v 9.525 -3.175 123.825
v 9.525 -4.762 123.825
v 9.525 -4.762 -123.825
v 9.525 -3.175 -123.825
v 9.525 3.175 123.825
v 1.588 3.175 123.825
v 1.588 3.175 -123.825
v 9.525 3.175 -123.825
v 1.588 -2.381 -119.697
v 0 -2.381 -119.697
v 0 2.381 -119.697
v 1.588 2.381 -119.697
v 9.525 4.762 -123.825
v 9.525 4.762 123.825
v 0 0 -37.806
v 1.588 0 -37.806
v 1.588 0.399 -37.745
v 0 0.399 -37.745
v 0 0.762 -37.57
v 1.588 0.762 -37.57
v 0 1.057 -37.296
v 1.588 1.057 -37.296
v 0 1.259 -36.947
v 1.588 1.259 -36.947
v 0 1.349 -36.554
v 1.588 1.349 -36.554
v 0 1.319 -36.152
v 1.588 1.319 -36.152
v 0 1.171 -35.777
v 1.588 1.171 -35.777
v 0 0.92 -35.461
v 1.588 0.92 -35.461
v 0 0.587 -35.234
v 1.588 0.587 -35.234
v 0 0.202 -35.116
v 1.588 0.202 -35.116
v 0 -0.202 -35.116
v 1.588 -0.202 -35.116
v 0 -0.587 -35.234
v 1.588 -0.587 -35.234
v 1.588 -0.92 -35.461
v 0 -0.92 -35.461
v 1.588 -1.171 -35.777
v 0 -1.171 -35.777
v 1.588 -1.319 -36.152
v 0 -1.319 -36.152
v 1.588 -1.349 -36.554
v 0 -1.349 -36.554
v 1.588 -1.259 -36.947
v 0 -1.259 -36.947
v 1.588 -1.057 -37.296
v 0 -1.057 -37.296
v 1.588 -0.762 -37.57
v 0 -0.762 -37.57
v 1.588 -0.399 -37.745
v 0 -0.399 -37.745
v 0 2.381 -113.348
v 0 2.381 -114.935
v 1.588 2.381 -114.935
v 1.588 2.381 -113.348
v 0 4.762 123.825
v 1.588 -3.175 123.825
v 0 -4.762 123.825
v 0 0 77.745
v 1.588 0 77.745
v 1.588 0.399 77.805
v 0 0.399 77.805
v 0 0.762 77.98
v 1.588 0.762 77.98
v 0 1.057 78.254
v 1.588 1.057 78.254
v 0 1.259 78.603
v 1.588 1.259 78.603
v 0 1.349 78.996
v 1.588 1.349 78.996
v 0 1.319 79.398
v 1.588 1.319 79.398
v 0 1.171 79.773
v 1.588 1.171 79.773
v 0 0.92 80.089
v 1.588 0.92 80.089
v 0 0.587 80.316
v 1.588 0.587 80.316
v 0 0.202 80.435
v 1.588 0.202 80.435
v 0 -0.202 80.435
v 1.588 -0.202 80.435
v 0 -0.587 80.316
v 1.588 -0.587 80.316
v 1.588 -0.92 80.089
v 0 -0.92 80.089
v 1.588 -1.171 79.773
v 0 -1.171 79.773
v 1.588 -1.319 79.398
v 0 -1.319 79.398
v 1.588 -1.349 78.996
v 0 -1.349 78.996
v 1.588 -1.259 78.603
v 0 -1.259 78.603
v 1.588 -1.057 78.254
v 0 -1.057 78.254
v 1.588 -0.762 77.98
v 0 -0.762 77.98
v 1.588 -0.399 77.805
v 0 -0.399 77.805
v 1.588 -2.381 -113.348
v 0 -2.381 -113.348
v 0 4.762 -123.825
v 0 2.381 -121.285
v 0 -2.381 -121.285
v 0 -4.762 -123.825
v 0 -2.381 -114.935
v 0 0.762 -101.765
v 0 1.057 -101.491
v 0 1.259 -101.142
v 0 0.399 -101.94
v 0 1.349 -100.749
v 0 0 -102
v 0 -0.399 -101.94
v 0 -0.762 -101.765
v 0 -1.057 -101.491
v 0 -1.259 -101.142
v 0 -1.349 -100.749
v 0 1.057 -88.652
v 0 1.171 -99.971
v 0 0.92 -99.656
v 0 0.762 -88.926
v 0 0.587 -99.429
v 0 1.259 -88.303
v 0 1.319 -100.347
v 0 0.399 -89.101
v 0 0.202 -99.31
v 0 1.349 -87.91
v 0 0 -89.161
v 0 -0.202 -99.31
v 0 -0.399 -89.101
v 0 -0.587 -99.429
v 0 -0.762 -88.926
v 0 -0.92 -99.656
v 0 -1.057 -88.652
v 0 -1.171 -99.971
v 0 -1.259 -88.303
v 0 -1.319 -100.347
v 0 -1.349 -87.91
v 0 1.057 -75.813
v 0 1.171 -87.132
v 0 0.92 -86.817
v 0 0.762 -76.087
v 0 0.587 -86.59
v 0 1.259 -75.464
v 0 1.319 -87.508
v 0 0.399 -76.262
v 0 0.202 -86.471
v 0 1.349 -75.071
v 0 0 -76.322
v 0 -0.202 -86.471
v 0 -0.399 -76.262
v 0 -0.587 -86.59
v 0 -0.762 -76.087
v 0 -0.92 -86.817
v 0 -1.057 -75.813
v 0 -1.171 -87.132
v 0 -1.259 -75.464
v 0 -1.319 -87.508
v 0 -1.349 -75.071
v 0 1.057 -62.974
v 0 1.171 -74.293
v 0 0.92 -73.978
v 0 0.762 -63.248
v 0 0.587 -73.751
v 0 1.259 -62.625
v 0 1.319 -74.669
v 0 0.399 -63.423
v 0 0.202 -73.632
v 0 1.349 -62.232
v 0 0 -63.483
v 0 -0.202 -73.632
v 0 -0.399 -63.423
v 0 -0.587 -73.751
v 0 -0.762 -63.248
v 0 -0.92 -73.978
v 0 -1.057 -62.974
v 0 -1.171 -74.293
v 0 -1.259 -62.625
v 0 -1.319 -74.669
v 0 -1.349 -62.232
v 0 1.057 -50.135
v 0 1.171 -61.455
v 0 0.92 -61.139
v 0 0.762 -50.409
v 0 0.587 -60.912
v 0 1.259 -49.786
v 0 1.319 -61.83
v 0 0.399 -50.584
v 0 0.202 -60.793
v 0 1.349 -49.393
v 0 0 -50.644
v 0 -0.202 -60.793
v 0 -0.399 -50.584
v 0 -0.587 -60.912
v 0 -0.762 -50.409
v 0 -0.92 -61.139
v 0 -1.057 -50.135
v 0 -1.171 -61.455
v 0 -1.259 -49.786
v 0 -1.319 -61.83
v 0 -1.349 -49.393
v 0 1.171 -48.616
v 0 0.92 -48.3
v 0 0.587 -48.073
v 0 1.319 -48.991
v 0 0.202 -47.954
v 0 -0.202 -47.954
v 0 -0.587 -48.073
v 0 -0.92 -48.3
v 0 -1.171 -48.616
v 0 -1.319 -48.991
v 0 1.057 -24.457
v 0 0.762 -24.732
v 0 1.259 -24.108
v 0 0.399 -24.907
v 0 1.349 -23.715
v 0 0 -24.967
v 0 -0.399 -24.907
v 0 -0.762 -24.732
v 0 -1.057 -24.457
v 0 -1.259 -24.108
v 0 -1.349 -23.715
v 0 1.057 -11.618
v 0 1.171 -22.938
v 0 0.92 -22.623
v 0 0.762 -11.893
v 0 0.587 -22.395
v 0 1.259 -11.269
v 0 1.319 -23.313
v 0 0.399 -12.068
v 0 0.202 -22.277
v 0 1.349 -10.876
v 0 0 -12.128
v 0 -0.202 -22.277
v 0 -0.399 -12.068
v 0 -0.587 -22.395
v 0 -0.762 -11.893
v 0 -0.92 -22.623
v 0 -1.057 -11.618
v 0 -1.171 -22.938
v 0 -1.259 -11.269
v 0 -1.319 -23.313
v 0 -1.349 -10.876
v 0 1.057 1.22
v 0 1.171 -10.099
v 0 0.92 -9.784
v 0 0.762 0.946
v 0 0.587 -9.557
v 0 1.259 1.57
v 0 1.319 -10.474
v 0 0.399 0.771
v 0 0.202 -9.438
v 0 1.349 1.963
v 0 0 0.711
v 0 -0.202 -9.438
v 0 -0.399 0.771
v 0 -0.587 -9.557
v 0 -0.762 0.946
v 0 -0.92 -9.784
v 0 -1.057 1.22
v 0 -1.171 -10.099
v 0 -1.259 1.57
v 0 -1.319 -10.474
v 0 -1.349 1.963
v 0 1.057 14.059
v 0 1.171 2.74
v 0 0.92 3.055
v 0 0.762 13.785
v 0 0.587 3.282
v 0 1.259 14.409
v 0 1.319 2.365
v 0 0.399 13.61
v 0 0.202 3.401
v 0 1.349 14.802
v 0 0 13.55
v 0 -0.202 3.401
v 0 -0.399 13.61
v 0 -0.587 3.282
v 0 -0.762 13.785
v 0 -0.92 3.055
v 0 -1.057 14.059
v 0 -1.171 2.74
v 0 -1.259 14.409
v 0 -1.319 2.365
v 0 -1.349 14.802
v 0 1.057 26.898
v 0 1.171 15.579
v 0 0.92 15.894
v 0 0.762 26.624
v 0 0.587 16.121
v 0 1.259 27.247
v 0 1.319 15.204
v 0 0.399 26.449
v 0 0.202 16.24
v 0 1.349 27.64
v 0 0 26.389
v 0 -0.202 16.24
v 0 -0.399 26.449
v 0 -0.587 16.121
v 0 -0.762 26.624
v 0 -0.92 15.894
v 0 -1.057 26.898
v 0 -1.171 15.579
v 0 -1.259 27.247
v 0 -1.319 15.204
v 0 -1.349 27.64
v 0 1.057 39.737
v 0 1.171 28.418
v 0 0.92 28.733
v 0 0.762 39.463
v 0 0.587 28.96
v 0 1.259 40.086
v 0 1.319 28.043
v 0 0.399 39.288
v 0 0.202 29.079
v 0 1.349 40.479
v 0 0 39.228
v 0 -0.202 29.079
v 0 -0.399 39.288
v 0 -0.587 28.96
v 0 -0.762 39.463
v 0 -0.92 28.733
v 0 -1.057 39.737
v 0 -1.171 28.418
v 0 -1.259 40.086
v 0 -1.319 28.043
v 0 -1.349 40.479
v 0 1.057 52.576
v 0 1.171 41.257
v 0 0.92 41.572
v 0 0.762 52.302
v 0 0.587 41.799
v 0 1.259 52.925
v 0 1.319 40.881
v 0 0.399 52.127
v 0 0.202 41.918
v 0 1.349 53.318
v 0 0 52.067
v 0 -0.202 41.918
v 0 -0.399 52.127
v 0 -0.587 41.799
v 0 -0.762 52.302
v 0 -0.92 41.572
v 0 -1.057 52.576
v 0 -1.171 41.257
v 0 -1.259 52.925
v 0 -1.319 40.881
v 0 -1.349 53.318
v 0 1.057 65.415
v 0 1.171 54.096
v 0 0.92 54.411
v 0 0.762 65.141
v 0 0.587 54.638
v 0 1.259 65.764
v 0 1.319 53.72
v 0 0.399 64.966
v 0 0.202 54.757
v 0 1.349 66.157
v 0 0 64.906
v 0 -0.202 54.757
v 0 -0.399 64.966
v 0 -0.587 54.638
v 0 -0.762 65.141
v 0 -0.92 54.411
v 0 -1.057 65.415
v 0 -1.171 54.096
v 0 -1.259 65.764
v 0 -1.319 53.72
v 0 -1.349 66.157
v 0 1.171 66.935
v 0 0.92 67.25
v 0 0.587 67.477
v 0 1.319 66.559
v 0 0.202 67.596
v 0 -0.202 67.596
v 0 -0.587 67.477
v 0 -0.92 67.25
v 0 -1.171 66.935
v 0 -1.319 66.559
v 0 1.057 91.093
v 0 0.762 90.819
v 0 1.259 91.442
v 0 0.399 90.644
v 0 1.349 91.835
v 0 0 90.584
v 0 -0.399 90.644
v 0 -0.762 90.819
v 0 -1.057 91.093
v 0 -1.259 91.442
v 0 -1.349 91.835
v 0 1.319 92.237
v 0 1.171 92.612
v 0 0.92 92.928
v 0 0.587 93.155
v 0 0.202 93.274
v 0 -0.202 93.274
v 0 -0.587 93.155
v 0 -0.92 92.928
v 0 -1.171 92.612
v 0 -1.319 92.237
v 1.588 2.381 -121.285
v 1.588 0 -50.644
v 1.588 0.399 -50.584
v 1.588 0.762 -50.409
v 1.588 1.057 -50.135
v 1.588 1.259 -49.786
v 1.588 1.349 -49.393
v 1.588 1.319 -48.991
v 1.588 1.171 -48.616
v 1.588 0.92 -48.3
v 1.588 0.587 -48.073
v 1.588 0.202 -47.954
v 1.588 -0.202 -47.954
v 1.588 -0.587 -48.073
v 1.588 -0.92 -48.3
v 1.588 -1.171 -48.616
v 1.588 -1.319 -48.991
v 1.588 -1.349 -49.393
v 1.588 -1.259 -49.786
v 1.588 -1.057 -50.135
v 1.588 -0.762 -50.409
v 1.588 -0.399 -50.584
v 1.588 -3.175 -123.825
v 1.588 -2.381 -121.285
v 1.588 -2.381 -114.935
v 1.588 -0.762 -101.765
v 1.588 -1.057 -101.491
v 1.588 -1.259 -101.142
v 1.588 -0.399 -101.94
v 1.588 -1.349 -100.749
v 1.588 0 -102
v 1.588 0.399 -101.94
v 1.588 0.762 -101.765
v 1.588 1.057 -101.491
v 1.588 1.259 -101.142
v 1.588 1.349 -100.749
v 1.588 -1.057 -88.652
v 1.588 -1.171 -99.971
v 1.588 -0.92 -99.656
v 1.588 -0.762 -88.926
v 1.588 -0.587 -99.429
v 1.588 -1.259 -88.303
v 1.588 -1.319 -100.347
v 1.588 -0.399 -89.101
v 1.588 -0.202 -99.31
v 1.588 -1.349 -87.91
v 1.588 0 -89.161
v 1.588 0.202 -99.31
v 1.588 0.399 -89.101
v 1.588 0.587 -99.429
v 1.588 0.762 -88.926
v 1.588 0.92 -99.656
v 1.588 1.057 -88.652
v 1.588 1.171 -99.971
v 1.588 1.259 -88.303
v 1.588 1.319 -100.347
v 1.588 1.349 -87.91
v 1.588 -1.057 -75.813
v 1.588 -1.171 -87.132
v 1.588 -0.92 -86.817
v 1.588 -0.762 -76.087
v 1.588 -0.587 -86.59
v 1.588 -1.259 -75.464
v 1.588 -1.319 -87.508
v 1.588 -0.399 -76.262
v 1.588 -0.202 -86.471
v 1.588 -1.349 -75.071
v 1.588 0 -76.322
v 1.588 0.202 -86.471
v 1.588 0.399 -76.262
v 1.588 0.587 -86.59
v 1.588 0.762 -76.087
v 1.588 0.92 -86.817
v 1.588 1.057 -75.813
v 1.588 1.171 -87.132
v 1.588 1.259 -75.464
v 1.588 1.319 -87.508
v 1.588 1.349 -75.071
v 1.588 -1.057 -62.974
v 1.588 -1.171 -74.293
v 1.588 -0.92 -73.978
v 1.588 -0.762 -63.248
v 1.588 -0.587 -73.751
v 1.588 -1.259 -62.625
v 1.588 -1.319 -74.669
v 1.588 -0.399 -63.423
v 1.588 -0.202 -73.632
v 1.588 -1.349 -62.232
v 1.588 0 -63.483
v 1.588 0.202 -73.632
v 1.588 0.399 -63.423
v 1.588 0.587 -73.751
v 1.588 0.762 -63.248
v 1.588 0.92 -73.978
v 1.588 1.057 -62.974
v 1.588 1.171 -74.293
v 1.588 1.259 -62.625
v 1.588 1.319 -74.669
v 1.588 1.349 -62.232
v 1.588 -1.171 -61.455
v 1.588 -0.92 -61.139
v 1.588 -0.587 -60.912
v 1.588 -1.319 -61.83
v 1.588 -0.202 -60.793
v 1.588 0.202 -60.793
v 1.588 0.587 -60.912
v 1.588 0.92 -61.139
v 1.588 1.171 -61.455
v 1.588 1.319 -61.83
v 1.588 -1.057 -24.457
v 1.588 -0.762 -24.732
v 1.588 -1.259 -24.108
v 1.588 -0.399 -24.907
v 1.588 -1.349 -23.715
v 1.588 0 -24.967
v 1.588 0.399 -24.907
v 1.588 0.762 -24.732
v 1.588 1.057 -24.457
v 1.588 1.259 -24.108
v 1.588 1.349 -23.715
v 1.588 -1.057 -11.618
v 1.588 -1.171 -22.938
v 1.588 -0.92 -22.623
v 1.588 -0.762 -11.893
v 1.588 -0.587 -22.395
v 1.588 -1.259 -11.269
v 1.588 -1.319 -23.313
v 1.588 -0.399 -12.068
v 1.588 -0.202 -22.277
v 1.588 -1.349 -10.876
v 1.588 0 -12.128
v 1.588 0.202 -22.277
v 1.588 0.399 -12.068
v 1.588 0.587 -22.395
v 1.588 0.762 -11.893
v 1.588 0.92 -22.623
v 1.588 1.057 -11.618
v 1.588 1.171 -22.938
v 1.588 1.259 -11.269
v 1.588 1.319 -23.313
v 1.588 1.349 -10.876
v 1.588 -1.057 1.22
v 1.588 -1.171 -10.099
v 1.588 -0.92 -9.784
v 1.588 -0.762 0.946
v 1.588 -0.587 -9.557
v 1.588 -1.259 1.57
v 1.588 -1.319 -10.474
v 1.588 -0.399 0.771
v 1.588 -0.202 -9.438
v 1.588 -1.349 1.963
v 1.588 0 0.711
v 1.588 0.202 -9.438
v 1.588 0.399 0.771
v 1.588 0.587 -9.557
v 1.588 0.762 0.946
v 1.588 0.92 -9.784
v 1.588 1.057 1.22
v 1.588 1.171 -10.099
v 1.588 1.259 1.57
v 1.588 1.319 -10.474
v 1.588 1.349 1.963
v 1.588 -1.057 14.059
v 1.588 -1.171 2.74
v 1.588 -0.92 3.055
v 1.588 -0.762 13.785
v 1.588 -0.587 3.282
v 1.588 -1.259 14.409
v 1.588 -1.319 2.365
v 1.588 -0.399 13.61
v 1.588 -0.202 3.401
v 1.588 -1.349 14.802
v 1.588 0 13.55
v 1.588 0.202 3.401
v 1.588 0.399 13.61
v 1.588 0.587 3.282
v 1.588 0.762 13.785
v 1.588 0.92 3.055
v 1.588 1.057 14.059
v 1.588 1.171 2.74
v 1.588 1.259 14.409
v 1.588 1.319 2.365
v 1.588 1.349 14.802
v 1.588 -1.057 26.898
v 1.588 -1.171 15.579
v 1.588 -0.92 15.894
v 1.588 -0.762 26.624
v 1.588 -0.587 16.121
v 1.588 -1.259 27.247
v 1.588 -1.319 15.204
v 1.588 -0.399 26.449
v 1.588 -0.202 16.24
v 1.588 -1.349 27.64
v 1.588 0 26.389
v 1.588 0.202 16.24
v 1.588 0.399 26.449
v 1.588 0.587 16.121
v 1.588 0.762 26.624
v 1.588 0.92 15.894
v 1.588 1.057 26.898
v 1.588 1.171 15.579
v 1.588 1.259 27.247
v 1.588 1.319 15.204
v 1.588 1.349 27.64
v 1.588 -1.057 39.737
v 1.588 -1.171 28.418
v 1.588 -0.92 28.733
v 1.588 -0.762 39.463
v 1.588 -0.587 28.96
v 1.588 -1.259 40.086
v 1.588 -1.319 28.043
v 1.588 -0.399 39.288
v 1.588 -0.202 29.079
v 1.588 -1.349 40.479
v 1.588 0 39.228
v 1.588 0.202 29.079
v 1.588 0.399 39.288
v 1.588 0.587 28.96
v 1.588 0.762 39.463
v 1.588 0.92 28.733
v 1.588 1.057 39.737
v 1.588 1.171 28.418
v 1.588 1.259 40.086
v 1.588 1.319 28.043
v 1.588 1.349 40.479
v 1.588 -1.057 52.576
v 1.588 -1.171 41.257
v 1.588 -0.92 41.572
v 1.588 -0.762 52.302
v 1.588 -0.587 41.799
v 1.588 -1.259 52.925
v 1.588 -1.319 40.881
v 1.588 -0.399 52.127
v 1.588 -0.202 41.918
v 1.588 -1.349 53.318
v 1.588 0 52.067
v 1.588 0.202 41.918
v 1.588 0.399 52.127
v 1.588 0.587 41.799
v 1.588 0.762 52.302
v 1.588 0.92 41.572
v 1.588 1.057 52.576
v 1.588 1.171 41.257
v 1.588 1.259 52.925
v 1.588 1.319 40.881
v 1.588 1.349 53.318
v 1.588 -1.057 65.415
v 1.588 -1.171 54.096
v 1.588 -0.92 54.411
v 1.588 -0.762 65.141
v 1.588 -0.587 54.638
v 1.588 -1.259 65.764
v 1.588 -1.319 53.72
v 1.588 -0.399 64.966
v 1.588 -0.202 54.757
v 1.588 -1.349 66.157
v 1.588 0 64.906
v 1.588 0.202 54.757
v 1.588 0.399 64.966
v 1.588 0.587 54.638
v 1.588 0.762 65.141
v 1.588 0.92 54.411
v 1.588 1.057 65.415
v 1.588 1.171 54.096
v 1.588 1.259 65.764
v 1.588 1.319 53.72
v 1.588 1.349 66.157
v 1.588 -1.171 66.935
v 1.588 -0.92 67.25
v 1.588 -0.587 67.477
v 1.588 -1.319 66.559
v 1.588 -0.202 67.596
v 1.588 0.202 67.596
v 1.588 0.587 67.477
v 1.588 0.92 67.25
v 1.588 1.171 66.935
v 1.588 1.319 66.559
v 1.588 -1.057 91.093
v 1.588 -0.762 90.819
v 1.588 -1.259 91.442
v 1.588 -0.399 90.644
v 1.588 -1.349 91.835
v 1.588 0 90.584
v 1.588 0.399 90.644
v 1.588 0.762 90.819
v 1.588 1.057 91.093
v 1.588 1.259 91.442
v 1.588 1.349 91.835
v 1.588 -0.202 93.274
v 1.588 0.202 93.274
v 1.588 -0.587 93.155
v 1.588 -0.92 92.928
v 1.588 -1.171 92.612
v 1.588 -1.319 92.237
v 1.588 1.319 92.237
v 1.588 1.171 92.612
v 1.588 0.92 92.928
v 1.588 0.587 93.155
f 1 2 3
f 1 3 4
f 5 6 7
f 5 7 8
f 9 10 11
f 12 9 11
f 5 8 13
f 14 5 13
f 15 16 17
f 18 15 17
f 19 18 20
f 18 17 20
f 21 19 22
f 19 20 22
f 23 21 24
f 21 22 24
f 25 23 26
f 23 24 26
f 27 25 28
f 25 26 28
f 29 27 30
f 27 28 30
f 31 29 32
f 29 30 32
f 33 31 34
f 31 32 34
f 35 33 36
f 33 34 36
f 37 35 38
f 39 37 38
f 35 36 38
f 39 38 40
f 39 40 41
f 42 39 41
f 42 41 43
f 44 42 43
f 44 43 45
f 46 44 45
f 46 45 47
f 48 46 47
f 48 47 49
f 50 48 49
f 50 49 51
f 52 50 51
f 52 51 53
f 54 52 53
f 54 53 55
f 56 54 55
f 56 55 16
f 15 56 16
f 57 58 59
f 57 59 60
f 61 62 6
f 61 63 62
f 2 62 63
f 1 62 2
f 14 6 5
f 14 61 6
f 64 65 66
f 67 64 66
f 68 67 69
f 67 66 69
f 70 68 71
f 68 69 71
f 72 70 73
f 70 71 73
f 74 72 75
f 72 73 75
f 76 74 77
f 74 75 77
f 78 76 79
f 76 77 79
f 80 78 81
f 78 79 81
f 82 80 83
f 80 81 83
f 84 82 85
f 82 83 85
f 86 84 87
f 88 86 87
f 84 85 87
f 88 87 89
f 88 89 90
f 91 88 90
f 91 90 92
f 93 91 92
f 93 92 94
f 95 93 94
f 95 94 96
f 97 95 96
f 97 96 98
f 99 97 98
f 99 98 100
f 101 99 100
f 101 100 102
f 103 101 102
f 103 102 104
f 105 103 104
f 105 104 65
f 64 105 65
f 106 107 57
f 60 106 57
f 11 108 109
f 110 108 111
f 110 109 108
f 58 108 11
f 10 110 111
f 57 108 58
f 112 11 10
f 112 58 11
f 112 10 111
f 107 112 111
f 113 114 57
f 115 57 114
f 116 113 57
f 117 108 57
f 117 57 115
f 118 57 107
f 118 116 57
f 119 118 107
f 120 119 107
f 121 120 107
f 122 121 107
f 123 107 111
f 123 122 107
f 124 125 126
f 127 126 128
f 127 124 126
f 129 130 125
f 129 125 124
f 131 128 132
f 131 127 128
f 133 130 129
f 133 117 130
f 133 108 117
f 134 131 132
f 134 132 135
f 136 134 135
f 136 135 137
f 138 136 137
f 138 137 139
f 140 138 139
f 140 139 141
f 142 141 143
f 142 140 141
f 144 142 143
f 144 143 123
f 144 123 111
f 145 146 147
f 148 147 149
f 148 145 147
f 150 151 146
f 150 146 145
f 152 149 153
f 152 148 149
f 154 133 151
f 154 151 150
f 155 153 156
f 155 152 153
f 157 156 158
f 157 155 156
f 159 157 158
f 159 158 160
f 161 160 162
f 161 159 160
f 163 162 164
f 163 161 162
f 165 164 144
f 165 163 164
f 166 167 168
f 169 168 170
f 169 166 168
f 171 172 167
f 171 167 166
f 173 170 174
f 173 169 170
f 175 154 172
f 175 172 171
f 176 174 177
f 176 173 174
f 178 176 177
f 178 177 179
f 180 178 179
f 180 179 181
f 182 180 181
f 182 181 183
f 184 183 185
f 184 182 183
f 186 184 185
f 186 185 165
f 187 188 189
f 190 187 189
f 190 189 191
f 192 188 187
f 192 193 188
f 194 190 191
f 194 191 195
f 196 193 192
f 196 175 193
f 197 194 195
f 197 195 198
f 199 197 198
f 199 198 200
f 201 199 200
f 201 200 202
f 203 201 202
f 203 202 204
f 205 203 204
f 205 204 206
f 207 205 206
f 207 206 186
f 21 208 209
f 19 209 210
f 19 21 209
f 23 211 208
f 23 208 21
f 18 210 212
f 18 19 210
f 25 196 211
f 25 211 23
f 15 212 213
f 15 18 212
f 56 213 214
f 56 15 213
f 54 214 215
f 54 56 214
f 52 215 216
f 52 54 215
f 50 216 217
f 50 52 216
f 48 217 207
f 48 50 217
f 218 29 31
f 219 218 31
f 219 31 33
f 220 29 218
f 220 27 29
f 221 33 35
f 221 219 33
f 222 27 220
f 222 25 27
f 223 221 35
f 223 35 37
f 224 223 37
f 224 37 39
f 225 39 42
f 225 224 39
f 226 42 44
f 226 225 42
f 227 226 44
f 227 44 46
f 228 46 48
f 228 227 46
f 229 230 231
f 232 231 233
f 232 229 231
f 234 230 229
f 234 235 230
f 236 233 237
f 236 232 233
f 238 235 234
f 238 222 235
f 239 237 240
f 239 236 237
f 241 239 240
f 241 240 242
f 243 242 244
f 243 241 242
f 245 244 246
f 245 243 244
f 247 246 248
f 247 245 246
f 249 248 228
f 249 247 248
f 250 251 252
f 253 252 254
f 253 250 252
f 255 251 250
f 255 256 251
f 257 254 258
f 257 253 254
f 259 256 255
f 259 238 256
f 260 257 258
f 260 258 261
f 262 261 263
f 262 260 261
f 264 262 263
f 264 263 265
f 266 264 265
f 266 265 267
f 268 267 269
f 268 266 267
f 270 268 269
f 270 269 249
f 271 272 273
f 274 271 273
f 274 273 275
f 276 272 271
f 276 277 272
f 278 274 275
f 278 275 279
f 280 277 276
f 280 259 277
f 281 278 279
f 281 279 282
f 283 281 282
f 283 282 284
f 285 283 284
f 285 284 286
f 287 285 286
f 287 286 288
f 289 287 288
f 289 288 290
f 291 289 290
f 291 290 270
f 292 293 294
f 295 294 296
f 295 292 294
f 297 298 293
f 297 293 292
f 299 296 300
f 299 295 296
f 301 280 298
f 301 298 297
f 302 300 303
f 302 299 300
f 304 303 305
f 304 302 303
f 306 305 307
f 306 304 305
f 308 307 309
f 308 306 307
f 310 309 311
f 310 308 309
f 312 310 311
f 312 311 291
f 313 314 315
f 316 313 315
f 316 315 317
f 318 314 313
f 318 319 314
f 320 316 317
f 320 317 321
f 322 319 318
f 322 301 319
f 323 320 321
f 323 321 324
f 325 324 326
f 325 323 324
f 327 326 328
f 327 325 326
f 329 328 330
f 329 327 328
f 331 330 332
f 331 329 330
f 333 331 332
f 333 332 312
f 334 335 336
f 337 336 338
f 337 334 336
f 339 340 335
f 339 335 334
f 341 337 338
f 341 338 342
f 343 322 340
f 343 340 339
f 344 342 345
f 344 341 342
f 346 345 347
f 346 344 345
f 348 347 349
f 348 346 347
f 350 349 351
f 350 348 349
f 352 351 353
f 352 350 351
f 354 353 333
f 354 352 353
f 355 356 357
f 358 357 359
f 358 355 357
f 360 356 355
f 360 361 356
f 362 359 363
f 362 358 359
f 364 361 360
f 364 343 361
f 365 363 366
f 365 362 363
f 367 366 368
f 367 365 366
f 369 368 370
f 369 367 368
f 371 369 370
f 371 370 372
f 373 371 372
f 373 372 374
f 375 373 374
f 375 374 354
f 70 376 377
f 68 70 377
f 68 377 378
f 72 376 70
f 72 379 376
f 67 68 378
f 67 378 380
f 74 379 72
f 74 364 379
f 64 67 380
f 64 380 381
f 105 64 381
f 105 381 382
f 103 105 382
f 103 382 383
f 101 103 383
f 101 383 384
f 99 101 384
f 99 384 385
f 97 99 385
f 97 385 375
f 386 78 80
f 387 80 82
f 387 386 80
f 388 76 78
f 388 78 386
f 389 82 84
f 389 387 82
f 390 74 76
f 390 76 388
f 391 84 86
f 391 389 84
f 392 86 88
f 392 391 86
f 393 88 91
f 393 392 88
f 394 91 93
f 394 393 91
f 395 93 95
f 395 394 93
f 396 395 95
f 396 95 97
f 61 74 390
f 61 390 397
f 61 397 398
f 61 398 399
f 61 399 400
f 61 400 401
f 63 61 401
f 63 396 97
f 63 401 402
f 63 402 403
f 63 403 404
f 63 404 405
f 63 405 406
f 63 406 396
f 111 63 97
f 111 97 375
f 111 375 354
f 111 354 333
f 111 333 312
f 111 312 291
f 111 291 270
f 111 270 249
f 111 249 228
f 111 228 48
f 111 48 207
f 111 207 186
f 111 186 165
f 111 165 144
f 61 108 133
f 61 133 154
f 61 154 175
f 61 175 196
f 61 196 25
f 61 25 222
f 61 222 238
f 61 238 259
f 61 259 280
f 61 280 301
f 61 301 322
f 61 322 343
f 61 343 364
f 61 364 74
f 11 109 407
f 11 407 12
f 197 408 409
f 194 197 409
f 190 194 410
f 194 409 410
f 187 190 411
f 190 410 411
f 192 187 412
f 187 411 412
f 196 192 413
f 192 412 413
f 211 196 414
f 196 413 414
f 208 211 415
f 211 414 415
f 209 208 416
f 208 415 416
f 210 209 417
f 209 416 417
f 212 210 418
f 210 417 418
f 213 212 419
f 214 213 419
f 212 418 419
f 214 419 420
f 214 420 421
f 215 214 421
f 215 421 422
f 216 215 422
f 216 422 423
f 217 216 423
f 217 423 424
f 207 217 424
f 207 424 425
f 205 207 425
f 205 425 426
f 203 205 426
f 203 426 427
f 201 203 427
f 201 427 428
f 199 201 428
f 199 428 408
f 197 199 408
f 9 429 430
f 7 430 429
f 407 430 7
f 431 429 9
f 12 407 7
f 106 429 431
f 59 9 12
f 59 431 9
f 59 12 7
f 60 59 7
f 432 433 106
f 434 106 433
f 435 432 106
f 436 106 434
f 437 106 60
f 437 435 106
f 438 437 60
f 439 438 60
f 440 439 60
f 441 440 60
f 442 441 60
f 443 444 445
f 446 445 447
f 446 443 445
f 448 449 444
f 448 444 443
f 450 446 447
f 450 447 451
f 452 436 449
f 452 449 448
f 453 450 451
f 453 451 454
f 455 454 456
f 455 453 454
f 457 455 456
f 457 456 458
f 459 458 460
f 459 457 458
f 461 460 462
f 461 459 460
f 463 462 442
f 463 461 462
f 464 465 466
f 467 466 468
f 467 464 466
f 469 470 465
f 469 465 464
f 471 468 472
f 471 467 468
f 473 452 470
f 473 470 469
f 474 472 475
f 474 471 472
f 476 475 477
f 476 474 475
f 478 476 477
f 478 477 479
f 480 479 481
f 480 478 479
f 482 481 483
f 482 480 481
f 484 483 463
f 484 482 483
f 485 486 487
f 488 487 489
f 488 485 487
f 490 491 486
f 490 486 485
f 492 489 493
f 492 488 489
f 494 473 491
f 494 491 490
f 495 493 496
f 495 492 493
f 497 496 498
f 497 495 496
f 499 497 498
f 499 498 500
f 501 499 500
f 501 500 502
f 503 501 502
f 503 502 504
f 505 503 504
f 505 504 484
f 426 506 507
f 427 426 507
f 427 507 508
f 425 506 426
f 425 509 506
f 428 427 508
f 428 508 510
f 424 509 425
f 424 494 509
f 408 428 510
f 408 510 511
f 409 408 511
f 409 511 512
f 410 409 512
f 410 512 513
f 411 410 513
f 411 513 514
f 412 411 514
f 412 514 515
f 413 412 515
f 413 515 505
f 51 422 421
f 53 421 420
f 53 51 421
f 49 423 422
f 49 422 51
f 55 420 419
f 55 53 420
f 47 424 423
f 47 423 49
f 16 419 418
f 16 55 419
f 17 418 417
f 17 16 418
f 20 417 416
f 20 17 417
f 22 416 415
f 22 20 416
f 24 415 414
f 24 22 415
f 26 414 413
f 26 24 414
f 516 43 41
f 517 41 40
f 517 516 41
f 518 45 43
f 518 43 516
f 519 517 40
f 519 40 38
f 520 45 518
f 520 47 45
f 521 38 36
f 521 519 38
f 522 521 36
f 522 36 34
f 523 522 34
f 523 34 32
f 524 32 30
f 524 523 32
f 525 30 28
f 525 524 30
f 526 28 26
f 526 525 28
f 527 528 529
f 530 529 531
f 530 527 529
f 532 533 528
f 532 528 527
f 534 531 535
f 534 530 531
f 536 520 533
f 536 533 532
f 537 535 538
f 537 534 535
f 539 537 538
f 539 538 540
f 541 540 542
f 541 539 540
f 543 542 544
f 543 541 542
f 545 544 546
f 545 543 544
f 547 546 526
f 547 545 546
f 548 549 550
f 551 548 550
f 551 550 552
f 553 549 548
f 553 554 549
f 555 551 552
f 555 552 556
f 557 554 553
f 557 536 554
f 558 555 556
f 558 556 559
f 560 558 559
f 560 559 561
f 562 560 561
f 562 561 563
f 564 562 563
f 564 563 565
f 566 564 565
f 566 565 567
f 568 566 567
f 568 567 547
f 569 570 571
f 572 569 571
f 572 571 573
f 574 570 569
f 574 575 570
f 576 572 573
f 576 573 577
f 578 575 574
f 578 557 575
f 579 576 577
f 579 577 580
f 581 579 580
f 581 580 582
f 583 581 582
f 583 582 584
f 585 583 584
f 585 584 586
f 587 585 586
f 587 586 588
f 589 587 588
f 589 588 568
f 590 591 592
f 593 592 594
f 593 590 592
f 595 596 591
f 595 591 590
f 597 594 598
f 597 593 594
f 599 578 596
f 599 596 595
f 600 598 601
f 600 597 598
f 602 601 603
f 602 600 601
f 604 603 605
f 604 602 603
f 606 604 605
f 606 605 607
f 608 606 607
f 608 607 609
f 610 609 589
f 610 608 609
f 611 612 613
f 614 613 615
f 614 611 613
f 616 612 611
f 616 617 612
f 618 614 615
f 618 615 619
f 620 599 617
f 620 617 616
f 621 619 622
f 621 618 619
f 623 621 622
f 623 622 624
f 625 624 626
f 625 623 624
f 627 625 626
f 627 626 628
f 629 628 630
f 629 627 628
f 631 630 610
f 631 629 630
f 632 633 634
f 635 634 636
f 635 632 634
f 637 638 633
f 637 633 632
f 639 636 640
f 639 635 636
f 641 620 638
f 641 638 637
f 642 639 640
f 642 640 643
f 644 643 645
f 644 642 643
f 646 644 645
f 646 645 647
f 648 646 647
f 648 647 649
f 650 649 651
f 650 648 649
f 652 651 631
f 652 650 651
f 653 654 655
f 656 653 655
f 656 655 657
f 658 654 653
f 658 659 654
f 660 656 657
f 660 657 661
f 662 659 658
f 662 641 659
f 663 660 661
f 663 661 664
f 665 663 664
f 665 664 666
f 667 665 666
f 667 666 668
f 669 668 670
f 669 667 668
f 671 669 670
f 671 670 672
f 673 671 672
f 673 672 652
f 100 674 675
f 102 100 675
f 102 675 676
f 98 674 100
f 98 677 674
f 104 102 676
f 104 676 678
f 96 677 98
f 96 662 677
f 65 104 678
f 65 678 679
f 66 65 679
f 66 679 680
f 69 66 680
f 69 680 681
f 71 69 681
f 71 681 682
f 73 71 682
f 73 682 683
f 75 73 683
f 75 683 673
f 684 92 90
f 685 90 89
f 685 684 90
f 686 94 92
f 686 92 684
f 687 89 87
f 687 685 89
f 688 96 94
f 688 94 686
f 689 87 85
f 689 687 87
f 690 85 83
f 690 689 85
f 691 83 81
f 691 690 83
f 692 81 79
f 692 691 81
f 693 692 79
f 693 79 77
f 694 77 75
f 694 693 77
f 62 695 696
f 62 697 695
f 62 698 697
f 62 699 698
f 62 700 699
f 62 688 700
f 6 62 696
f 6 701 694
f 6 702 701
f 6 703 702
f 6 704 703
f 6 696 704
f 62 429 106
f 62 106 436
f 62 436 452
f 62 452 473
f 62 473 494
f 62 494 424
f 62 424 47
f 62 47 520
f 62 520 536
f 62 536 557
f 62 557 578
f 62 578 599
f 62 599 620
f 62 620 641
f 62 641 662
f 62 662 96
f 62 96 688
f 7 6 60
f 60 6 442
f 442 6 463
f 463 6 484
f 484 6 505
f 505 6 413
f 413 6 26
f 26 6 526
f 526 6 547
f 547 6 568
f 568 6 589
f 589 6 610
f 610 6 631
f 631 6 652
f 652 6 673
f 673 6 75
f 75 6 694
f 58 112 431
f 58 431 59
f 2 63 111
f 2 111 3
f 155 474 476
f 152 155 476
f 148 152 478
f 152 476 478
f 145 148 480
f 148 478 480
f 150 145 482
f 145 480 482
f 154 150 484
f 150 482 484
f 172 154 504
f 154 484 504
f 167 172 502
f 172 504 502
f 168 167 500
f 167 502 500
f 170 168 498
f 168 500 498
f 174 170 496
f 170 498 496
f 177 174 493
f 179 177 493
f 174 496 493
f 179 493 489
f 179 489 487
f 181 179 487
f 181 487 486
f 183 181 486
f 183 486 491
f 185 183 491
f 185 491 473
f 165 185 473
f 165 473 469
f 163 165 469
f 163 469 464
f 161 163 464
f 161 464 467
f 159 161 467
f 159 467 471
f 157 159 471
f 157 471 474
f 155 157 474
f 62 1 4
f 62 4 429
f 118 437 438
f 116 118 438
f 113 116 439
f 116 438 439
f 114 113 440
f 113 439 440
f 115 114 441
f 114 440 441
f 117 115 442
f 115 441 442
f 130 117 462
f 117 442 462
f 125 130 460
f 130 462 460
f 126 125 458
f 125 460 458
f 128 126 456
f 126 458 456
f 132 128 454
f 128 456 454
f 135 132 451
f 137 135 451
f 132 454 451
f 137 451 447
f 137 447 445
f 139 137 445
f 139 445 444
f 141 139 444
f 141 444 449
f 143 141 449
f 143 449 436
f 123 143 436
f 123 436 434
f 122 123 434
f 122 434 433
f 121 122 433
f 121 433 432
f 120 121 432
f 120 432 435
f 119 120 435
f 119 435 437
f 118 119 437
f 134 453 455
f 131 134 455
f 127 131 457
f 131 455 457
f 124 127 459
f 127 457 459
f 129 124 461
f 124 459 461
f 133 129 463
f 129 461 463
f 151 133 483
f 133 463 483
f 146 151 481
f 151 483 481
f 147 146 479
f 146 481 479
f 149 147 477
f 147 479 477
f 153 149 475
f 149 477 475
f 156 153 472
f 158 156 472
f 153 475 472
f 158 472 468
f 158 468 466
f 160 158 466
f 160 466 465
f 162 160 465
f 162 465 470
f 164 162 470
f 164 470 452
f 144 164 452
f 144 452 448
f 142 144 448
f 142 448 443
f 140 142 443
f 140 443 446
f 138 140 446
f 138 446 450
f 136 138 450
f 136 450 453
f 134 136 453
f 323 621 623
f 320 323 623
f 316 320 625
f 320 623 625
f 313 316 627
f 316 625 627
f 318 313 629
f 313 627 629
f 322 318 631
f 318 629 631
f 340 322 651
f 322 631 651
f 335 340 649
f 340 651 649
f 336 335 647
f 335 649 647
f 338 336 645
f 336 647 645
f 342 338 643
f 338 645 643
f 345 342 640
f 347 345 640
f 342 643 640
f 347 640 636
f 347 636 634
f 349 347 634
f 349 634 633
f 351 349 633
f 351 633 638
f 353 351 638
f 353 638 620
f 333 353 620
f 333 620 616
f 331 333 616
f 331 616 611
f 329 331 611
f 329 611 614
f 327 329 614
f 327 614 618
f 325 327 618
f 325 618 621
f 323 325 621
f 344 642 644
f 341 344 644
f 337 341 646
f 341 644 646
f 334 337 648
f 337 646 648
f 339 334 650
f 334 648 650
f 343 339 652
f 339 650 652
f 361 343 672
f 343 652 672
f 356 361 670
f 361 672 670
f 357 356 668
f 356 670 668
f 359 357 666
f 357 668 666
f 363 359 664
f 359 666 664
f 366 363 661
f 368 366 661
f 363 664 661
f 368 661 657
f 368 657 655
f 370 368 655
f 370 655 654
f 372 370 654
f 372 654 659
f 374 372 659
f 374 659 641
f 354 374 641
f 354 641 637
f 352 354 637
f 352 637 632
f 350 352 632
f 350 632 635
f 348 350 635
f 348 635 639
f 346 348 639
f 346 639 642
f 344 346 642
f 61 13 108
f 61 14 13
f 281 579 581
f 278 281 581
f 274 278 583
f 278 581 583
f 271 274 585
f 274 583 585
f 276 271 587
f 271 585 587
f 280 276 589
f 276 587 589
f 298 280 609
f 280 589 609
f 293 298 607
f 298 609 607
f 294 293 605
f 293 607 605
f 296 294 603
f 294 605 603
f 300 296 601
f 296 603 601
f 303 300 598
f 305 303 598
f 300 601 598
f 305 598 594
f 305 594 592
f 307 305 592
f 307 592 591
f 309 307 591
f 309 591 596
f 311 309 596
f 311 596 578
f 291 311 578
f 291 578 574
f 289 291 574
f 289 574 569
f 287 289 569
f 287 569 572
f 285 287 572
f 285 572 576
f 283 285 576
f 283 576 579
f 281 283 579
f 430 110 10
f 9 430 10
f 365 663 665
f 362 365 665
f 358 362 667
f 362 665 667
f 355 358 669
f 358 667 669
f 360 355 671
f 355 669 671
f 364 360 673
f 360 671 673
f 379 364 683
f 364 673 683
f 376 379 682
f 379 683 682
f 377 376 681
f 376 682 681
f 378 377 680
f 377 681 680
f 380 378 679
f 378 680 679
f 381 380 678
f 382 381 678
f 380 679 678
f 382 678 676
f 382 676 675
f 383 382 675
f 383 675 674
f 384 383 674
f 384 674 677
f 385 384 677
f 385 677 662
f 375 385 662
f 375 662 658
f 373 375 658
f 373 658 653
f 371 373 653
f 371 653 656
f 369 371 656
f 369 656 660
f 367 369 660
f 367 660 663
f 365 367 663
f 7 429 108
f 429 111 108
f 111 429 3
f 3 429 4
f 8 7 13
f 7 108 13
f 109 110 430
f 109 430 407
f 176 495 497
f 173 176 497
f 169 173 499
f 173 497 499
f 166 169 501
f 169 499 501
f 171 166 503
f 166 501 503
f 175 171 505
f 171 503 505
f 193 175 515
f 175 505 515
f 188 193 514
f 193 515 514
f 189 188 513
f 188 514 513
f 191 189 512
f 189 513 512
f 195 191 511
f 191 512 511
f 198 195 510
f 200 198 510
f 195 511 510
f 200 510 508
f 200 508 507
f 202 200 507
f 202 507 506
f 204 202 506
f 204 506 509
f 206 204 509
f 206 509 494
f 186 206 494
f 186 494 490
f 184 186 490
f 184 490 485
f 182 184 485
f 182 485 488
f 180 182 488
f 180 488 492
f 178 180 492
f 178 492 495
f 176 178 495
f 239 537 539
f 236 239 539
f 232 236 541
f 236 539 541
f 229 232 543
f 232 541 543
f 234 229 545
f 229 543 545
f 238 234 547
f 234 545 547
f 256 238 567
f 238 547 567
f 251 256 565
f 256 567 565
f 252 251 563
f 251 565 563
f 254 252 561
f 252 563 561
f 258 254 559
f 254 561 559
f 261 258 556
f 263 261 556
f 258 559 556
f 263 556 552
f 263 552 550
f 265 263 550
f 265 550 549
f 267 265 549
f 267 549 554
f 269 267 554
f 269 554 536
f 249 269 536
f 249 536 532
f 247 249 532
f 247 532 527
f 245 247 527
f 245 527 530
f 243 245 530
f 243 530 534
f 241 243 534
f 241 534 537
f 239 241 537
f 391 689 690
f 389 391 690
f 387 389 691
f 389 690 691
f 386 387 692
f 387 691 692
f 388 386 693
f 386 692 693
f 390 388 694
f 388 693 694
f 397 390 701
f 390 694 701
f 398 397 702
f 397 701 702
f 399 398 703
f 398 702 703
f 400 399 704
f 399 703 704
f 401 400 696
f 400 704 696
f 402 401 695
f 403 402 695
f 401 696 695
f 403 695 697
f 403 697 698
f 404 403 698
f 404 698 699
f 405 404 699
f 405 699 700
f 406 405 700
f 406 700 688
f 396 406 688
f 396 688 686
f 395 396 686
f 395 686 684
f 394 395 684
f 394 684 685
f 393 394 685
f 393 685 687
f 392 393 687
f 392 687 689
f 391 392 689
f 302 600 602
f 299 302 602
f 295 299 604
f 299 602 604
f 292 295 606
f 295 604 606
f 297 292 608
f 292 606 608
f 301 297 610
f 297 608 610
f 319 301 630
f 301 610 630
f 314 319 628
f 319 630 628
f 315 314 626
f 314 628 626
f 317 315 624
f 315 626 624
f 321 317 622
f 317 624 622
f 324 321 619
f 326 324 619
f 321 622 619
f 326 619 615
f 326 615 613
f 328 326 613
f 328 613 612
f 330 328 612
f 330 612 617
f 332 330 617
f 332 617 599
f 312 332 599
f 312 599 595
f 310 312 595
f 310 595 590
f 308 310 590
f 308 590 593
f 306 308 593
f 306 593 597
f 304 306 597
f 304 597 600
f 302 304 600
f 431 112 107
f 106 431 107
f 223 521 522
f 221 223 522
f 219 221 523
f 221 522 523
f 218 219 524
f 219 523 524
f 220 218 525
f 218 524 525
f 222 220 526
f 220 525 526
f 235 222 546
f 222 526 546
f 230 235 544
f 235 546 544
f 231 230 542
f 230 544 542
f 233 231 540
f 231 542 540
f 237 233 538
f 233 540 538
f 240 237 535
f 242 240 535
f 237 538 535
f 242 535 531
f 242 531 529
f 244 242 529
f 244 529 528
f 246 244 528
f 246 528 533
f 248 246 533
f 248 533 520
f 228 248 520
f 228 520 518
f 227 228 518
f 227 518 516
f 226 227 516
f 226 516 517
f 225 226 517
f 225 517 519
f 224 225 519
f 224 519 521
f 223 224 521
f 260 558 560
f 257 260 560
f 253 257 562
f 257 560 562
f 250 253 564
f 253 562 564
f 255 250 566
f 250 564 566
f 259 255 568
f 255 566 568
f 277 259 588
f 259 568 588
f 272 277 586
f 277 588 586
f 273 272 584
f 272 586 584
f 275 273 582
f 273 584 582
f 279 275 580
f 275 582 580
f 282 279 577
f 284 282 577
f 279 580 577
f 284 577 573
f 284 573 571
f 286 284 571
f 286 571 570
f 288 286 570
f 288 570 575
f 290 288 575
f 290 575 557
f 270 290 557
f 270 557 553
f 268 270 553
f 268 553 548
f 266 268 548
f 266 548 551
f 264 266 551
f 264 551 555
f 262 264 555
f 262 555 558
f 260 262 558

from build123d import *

# Parameters (mm, degrees)
BOSS_EXTRUDE1_DEPTH       = 123.825
SKETCH11_W                = 1.5875
SKETCH11_H                = 4.7625
CUT_EXTRUDE2_DEPTH        = 10.525
F_6_32_TAPPED_HOLE1_D     = 2.7051
F_6_32_TAPPED_HOLE1_DEPTH = 9.398


with BuildPart() as part:
    # Sketch1 → Boss-Extrude1 (new body, symmetric)
    with BuildSketch(Plane.XY):
        Polygon((0, 4.7625), (0, -4.7625), (9.525, -4.7625), (9.525, -3.175), (1.5875, -3.175), (1.5875, 3.175), (9.525, 3.175), (9.525, 4.7625), align=None)
    extrude(amount=BOSS_EXTRUDE1_DEPTH, both=True)

    # Sketch11 → Cut-Extrude2 (cut, through all)
    with BuildSketch(Plane.ZY):
        with Locations((-120.49125, 0)):
            Rectangle(SKETCH11_W, SKETCH11_H)
        with Locations((-114.14125, 0)):
            Rectangle(SKETCH11_W, SKETCH11_H)
    extrude(amount=-CUT_EXTRUDE2_DEPTH, mode=Mode.SUBTRACT)

    # #6-32 Tapped Hole1
    with Locations(Plane.ZY):
        with Locations((-100.6475, 0), (-87.80859375, 0), (-74.9696875, 0), (-62.13078125, 0), (-49.291875, 0), (-36.45296875, 0), (-23.6140625, 0), (-10.77515625, 0), (2.06375, 0), (14.90265625, 0), (27.7415625, 0), (40.58046875, 0), (53.419375, 0), (66.25828125, 0), (79.0971875, 0), (91.93609375, 0)):
            Hole(F_6_32_TAPPED_HOLE1_D / 2, depth=F_6_32_TAPPED_HOLE1_DEPTH)


solid = part.part
